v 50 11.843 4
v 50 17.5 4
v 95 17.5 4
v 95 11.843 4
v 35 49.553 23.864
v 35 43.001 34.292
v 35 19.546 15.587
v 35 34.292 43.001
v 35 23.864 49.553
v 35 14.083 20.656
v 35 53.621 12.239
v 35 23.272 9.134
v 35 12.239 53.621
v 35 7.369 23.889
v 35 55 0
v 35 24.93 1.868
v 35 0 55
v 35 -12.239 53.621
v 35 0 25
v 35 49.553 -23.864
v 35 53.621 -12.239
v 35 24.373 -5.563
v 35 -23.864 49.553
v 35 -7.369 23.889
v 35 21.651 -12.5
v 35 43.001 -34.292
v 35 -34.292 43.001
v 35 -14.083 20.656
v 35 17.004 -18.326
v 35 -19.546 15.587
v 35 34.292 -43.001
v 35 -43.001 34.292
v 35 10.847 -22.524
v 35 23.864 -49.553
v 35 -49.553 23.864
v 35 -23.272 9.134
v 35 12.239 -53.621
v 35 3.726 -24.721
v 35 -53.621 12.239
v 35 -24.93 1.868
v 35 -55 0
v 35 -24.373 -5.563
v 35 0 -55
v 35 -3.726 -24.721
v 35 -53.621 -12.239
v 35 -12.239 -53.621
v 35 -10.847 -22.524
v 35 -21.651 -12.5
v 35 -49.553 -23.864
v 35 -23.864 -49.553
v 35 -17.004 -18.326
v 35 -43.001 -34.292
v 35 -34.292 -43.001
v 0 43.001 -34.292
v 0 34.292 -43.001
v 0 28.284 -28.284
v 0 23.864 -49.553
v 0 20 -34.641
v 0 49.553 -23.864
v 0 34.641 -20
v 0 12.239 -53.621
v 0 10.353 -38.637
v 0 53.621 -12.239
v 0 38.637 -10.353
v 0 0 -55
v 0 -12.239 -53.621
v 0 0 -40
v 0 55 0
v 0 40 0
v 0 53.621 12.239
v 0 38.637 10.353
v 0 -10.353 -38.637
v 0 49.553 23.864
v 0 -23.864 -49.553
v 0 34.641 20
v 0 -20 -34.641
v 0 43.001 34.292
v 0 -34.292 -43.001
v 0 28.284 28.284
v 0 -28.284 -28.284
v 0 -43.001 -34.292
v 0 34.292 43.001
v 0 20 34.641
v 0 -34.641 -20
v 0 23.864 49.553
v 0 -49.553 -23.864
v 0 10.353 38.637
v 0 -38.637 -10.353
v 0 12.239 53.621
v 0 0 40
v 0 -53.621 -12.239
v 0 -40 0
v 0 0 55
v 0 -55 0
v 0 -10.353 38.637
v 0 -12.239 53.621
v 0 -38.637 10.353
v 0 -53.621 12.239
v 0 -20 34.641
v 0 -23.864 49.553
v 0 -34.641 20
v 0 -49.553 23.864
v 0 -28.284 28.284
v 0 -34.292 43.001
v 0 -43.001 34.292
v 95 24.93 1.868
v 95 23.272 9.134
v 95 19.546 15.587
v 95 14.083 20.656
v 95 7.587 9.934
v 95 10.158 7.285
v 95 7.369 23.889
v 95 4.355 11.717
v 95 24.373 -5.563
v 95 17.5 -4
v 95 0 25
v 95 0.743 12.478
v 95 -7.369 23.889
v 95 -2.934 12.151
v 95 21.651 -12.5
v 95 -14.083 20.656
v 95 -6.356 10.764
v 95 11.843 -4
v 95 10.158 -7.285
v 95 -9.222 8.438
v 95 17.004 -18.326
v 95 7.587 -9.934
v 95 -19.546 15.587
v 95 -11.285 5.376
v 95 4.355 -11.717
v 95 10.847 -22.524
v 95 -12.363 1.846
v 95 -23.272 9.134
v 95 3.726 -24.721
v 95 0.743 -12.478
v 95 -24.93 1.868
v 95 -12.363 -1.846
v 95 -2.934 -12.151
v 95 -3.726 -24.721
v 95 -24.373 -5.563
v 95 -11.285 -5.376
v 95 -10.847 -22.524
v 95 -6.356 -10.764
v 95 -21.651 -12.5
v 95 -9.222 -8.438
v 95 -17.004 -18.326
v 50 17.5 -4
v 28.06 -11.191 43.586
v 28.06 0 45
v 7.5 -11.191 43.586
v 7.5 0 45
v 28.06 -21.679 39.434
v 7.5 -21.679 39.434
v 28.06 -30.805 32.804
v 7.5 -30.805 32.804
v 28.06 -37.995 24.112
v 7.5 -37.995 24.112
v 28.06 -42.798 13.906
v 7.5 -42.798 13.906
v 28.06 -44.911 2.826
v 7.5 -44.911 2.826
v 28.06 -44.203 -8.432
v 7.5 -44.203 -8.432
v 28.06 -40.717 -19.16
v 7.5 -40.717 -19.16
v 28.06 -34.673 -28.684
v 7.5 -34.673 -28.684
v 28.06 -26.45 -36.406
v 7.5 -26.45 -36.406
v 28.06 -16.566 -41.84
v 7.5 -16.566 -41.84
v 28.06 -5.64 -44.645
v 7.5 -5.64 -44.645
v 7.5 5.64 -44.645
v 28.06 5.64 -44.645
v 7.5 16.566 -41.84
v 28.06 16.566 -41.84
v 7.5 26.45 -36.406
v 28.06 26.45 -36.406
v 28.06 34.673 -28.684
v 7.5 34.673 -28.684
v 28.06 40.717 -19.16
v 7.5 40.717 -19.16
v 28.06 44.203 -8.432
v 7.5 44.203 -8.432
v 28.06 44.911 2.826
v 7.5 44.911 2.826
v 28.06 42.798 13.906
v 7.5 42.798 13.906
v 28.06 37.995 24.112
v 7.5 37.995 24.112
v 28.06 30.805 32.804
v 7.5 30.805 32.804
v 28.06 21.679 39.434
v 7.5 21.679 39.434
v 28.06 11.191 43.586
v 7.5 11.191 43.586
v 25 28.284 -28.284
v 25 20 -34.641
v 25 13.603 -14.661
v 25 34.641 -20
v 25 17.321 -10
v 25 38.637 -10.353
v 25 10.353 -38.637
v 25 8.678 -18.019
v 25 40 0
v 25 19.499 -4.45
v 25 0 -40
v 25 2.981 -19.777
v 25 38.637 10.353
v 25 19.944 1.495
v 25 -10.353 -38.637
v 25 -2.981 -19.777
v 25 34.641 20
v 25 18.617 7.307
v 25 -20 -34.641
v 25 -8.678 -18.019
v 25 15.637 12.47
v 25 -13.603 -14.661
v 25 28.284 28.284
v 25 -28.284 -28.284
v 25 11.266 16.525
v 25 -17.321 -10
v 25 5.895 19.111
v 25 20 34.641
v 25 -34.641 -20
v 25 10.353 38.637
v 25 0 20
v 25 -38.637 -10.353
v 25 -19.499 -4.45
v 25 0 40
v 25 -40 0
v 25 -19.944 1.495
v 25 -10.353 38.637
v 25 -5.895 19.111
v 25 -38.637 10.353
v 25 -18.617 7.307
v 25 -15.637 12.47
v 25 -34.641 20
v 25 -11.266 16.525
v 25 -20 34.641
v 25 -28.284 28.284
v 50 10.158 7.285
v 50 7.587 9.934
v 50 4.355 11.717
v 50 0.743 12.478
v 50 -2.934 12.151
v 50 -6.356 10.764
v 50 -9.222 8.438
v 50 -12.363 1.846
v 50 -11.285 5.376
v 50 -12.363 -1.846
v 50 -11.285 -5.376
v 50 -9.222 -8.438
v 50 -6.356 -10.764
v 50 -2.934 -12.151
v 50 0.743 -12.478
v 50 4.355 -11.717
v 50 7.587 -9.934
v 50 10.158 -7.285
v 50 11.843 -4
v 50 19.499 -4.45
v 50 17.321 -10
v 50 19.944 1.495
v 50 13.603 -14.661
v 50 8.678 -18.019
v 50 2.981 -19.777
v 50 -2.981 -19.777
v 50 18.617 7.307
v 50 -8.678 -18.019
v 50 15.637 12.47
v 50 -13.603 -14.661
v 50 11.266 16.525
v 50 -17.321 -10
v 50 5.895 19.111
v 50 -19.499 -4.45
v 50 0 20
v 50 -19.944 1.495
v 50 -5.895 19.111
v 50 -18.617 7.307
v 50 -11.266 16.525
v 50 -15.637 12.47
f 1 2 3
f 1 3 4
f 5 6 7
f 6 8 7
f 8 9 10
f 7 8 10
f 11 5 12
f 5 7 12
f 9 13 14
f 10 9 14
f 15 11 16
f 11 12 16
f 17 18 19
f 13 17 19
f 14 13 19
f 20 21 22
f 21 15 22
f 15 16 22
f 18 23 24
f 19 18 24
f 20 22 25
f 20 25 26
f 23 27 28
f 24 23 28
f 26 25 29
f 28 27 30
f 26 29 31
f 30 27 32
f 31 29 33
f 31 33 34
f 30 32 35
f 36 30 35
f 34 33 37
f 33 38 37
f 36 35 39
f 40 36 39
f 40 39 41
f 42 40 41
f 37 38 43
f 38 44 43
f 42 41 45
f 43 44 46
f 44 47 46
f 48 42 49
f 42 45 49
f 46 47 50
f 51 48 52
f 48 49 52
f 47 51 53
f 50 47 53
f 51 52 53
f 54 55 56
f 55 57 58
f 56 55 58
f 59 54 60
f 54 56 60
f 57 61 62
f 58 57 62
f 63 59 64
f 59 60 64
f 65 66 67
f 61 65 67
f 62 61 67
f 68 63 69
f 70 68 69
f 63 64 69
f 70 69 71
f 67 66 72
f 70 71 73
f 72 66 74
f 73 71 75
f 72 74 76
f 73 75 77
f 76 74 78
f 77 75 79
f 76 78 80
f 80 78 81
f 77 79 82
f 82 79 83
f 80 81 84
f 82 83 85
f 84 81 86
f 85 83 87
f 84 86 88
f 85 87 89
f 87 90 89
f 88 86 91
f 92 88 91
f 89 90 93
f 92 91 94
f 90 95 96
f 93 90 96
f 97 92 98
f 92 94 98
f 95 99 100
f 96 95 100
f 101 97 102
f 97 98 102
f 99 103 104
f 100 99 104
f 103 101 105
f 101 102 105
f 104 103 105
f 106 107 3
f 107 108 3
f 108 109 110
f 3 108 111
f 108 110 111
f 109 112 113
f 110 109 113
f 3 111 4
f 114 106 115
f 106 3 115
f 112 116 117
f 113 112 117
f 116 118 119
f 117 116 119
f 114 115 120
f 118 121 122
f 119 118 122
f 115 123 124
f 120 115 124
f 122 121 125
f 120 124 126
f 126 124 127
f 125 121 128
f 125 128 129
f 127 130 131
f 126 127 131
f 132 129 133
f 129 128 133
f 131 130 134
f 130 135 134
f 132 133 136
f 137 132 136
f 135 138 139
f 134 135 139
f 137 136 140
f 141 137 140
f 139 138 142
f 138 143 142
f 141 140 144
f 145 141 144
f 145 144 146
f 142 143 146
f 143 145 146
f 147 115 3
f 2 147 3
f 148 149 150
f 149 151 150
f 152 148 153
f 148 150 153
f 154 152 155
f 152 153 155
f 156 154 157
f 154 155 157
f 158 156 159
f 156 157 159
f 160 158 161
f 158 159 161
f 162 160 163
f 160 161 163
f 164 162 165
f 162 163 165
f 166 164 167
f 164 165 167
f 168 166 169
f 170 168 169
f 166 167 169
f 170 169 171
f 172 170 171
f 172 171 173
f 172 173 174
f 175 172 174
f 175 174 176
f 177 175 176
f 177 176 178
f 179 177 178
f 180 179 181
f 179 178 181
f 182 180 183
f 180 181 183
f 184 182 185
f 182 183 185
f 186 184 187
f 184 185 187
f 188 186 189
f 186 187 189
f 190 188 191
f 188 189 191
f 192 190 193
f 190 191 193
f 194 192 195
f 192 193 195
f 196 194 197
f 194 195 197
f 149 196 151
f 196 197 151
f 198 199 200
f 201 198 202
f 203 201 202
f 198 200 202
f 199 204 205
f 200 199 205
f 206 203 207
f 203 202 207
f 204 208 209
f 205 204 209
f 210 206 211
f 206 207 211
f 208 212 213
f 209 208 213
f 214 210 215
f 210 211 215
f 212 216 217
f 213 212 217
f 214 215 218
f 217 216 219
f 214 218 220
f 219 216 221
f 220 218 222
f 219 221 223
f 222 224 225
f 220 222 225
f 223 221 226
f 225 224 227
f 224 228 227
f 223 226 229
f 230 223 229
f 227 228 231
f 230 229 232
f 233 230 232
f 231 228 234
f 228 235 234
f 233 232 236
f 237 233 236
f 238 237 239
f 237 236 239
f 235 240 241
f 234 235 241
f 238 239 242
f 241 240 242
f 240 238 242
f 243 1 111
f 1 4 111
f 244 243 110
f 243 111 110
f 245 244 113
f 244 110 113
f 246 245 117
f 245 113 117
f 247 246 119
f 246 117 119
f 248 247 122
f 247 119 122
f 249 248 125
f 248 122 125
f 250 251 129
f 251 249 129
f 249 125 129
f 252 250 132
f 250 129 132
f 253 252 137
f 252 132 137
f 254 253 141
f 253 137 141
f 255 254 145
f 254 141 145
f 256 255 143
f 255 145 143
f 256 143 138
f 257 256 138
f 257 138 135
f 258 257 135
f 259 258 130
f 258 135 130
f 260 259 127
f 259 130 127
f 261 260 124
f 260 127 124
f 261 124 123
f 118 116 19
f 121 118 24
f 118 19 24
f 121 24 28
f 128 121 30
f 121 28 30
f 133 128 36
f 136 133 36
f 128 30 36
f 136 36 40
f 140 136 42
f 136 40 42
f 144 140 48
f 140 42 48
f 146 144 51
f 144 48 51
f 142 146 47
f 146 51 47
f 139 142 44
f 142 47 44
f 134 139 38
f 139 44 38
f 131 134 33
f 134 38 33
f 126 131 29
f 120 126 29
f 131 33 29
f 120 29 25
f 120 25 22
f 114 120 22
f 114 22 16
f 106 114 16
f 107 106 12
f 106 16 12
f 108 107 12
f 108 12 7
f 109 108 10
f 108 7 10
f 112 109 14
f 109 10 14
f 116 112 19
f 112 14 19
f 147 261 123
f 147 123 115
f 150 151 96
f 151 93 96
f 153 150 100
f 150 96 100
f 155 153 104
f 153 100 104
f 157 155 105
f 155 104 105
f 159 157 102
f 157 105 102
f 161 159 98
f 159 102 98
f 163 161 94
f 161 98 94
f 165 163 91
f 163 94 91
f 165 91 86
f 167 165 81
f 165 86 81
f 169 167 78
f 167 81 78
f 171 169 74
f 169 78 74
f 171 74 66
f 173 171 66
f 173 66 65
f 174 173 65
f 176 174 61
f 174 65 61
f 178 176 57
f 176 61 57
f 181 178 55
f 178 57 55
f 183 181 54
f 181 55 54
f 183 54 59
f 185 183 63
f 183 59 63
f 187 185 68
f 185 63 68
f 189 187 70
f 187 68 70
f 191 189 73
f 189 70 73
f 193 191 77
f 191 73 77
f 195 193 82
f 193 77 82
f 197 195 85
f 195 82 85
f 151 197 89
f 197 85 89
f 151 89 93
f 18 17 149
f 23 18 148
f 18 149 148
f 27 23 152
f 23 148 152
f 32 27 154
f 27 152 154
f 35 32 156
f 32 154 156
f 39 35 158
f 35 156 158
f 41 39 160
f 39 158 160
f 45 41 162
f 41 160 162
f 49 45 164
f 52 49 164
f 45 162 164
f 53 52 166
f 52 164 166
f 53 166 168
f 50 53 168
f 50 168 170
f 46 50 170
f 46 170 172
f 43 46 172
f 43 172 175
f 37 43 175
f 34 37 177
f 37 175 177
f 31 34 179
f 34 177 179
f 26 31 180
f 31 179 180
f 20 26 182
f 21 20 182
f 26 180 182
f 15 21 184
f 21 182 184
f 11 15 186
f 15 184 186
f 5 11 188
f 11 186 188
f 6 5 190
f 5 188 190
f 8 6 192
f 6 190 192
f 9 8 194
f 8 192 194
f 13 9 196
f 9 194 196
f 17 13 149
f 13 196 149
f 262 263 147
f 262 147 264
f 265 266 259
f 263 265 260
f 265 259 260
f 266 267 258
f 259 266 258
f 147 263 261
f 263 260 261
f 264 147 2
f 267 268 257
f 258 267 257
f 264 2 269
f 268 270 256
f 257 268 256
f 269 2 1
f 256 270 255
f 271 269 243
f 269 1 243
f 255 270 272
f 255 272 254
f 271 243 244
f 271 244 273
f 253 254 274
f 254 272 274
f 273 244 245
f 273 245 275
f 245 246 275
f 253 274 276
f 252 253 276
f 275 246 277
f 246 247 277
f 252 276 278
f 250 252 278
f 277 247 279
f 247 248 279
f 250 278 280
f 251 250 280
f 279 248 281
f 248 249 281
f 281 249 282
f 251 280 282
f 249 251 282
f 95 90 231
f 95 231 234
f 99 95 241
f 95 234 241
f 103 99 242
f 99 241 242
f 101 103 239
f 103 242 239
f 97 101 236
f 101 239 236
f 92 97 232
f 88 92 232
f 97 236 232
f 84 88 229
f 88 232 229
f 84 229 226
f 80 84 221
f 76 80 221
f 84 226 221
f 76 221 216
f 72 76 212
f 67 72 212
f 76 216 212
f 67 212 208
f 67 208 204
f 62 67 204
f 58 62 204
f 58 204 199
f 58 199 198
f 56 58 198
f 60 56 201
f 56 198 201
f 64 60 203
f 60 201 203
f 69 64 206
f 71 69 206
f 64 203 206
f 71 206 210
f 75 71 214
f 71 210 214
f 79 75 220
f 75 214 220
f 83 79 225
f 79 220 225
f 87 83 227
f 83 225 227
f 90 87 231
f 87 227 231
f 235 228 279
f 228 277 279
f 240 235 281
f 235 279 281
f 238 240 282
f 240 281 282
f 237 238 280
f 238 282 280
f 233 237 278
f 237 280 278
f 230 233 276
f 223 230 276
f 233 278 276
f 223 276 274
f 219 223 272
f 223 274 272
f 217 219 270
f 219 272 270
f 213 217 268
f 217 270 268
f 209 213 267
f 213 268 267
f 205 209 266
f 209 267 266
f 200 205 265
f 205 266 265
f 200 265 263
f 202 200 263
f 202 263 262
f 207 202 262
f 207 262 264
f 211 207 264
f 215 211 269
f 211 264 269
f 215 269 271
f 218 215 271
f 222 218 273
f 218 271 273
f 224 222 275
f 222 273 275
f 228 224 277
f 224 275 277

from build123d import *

# Parameters (mm, degrees)
CUT_EXTRUDE2_DEPTH = 123.780291578


with BuildPart() as part:
    # Sketch1 → Revolve1 (revolve)
    with BuildSketch(Plane(origin=(0, 0, 0), x_dir=(1, 0, 0), z_dir=(0, 1, 0)), mode=Mode.PRIVATE) as revolve1_sk:
        Polygon((95, 12.5), (95, 25), (35, 25), (35, 55), (28.060411696, 45), (7.5, 45), (0, 55), (0, 40), (25, 40), (25, 20), (50, 20), (50, 12.5), align=None)
    revolve(revolve1_sk.sketch.rotate(Axis((0, 0, 0), (1, 0, 0)), 180), axis=Axis((0, 0, 0), (1, 0, 0)))

    # Sketch3 → Cut-Extrude2 (cut, through all)
    with BuildSketch(Plane(origin=(95, 0, 0), x_dir=(0, 0, -1), z_dir=(1, 0, 0))):
        Polygon((0, 17.5), (-4, 17.5), (-4, 10.118492904), (4, 10.118492904), (4, 17.5), align=None)
    extrude(amount=-CUT_EXTRUDE2_DEPTH, mode=Mode.SUBTRACT)


solid = part.part
